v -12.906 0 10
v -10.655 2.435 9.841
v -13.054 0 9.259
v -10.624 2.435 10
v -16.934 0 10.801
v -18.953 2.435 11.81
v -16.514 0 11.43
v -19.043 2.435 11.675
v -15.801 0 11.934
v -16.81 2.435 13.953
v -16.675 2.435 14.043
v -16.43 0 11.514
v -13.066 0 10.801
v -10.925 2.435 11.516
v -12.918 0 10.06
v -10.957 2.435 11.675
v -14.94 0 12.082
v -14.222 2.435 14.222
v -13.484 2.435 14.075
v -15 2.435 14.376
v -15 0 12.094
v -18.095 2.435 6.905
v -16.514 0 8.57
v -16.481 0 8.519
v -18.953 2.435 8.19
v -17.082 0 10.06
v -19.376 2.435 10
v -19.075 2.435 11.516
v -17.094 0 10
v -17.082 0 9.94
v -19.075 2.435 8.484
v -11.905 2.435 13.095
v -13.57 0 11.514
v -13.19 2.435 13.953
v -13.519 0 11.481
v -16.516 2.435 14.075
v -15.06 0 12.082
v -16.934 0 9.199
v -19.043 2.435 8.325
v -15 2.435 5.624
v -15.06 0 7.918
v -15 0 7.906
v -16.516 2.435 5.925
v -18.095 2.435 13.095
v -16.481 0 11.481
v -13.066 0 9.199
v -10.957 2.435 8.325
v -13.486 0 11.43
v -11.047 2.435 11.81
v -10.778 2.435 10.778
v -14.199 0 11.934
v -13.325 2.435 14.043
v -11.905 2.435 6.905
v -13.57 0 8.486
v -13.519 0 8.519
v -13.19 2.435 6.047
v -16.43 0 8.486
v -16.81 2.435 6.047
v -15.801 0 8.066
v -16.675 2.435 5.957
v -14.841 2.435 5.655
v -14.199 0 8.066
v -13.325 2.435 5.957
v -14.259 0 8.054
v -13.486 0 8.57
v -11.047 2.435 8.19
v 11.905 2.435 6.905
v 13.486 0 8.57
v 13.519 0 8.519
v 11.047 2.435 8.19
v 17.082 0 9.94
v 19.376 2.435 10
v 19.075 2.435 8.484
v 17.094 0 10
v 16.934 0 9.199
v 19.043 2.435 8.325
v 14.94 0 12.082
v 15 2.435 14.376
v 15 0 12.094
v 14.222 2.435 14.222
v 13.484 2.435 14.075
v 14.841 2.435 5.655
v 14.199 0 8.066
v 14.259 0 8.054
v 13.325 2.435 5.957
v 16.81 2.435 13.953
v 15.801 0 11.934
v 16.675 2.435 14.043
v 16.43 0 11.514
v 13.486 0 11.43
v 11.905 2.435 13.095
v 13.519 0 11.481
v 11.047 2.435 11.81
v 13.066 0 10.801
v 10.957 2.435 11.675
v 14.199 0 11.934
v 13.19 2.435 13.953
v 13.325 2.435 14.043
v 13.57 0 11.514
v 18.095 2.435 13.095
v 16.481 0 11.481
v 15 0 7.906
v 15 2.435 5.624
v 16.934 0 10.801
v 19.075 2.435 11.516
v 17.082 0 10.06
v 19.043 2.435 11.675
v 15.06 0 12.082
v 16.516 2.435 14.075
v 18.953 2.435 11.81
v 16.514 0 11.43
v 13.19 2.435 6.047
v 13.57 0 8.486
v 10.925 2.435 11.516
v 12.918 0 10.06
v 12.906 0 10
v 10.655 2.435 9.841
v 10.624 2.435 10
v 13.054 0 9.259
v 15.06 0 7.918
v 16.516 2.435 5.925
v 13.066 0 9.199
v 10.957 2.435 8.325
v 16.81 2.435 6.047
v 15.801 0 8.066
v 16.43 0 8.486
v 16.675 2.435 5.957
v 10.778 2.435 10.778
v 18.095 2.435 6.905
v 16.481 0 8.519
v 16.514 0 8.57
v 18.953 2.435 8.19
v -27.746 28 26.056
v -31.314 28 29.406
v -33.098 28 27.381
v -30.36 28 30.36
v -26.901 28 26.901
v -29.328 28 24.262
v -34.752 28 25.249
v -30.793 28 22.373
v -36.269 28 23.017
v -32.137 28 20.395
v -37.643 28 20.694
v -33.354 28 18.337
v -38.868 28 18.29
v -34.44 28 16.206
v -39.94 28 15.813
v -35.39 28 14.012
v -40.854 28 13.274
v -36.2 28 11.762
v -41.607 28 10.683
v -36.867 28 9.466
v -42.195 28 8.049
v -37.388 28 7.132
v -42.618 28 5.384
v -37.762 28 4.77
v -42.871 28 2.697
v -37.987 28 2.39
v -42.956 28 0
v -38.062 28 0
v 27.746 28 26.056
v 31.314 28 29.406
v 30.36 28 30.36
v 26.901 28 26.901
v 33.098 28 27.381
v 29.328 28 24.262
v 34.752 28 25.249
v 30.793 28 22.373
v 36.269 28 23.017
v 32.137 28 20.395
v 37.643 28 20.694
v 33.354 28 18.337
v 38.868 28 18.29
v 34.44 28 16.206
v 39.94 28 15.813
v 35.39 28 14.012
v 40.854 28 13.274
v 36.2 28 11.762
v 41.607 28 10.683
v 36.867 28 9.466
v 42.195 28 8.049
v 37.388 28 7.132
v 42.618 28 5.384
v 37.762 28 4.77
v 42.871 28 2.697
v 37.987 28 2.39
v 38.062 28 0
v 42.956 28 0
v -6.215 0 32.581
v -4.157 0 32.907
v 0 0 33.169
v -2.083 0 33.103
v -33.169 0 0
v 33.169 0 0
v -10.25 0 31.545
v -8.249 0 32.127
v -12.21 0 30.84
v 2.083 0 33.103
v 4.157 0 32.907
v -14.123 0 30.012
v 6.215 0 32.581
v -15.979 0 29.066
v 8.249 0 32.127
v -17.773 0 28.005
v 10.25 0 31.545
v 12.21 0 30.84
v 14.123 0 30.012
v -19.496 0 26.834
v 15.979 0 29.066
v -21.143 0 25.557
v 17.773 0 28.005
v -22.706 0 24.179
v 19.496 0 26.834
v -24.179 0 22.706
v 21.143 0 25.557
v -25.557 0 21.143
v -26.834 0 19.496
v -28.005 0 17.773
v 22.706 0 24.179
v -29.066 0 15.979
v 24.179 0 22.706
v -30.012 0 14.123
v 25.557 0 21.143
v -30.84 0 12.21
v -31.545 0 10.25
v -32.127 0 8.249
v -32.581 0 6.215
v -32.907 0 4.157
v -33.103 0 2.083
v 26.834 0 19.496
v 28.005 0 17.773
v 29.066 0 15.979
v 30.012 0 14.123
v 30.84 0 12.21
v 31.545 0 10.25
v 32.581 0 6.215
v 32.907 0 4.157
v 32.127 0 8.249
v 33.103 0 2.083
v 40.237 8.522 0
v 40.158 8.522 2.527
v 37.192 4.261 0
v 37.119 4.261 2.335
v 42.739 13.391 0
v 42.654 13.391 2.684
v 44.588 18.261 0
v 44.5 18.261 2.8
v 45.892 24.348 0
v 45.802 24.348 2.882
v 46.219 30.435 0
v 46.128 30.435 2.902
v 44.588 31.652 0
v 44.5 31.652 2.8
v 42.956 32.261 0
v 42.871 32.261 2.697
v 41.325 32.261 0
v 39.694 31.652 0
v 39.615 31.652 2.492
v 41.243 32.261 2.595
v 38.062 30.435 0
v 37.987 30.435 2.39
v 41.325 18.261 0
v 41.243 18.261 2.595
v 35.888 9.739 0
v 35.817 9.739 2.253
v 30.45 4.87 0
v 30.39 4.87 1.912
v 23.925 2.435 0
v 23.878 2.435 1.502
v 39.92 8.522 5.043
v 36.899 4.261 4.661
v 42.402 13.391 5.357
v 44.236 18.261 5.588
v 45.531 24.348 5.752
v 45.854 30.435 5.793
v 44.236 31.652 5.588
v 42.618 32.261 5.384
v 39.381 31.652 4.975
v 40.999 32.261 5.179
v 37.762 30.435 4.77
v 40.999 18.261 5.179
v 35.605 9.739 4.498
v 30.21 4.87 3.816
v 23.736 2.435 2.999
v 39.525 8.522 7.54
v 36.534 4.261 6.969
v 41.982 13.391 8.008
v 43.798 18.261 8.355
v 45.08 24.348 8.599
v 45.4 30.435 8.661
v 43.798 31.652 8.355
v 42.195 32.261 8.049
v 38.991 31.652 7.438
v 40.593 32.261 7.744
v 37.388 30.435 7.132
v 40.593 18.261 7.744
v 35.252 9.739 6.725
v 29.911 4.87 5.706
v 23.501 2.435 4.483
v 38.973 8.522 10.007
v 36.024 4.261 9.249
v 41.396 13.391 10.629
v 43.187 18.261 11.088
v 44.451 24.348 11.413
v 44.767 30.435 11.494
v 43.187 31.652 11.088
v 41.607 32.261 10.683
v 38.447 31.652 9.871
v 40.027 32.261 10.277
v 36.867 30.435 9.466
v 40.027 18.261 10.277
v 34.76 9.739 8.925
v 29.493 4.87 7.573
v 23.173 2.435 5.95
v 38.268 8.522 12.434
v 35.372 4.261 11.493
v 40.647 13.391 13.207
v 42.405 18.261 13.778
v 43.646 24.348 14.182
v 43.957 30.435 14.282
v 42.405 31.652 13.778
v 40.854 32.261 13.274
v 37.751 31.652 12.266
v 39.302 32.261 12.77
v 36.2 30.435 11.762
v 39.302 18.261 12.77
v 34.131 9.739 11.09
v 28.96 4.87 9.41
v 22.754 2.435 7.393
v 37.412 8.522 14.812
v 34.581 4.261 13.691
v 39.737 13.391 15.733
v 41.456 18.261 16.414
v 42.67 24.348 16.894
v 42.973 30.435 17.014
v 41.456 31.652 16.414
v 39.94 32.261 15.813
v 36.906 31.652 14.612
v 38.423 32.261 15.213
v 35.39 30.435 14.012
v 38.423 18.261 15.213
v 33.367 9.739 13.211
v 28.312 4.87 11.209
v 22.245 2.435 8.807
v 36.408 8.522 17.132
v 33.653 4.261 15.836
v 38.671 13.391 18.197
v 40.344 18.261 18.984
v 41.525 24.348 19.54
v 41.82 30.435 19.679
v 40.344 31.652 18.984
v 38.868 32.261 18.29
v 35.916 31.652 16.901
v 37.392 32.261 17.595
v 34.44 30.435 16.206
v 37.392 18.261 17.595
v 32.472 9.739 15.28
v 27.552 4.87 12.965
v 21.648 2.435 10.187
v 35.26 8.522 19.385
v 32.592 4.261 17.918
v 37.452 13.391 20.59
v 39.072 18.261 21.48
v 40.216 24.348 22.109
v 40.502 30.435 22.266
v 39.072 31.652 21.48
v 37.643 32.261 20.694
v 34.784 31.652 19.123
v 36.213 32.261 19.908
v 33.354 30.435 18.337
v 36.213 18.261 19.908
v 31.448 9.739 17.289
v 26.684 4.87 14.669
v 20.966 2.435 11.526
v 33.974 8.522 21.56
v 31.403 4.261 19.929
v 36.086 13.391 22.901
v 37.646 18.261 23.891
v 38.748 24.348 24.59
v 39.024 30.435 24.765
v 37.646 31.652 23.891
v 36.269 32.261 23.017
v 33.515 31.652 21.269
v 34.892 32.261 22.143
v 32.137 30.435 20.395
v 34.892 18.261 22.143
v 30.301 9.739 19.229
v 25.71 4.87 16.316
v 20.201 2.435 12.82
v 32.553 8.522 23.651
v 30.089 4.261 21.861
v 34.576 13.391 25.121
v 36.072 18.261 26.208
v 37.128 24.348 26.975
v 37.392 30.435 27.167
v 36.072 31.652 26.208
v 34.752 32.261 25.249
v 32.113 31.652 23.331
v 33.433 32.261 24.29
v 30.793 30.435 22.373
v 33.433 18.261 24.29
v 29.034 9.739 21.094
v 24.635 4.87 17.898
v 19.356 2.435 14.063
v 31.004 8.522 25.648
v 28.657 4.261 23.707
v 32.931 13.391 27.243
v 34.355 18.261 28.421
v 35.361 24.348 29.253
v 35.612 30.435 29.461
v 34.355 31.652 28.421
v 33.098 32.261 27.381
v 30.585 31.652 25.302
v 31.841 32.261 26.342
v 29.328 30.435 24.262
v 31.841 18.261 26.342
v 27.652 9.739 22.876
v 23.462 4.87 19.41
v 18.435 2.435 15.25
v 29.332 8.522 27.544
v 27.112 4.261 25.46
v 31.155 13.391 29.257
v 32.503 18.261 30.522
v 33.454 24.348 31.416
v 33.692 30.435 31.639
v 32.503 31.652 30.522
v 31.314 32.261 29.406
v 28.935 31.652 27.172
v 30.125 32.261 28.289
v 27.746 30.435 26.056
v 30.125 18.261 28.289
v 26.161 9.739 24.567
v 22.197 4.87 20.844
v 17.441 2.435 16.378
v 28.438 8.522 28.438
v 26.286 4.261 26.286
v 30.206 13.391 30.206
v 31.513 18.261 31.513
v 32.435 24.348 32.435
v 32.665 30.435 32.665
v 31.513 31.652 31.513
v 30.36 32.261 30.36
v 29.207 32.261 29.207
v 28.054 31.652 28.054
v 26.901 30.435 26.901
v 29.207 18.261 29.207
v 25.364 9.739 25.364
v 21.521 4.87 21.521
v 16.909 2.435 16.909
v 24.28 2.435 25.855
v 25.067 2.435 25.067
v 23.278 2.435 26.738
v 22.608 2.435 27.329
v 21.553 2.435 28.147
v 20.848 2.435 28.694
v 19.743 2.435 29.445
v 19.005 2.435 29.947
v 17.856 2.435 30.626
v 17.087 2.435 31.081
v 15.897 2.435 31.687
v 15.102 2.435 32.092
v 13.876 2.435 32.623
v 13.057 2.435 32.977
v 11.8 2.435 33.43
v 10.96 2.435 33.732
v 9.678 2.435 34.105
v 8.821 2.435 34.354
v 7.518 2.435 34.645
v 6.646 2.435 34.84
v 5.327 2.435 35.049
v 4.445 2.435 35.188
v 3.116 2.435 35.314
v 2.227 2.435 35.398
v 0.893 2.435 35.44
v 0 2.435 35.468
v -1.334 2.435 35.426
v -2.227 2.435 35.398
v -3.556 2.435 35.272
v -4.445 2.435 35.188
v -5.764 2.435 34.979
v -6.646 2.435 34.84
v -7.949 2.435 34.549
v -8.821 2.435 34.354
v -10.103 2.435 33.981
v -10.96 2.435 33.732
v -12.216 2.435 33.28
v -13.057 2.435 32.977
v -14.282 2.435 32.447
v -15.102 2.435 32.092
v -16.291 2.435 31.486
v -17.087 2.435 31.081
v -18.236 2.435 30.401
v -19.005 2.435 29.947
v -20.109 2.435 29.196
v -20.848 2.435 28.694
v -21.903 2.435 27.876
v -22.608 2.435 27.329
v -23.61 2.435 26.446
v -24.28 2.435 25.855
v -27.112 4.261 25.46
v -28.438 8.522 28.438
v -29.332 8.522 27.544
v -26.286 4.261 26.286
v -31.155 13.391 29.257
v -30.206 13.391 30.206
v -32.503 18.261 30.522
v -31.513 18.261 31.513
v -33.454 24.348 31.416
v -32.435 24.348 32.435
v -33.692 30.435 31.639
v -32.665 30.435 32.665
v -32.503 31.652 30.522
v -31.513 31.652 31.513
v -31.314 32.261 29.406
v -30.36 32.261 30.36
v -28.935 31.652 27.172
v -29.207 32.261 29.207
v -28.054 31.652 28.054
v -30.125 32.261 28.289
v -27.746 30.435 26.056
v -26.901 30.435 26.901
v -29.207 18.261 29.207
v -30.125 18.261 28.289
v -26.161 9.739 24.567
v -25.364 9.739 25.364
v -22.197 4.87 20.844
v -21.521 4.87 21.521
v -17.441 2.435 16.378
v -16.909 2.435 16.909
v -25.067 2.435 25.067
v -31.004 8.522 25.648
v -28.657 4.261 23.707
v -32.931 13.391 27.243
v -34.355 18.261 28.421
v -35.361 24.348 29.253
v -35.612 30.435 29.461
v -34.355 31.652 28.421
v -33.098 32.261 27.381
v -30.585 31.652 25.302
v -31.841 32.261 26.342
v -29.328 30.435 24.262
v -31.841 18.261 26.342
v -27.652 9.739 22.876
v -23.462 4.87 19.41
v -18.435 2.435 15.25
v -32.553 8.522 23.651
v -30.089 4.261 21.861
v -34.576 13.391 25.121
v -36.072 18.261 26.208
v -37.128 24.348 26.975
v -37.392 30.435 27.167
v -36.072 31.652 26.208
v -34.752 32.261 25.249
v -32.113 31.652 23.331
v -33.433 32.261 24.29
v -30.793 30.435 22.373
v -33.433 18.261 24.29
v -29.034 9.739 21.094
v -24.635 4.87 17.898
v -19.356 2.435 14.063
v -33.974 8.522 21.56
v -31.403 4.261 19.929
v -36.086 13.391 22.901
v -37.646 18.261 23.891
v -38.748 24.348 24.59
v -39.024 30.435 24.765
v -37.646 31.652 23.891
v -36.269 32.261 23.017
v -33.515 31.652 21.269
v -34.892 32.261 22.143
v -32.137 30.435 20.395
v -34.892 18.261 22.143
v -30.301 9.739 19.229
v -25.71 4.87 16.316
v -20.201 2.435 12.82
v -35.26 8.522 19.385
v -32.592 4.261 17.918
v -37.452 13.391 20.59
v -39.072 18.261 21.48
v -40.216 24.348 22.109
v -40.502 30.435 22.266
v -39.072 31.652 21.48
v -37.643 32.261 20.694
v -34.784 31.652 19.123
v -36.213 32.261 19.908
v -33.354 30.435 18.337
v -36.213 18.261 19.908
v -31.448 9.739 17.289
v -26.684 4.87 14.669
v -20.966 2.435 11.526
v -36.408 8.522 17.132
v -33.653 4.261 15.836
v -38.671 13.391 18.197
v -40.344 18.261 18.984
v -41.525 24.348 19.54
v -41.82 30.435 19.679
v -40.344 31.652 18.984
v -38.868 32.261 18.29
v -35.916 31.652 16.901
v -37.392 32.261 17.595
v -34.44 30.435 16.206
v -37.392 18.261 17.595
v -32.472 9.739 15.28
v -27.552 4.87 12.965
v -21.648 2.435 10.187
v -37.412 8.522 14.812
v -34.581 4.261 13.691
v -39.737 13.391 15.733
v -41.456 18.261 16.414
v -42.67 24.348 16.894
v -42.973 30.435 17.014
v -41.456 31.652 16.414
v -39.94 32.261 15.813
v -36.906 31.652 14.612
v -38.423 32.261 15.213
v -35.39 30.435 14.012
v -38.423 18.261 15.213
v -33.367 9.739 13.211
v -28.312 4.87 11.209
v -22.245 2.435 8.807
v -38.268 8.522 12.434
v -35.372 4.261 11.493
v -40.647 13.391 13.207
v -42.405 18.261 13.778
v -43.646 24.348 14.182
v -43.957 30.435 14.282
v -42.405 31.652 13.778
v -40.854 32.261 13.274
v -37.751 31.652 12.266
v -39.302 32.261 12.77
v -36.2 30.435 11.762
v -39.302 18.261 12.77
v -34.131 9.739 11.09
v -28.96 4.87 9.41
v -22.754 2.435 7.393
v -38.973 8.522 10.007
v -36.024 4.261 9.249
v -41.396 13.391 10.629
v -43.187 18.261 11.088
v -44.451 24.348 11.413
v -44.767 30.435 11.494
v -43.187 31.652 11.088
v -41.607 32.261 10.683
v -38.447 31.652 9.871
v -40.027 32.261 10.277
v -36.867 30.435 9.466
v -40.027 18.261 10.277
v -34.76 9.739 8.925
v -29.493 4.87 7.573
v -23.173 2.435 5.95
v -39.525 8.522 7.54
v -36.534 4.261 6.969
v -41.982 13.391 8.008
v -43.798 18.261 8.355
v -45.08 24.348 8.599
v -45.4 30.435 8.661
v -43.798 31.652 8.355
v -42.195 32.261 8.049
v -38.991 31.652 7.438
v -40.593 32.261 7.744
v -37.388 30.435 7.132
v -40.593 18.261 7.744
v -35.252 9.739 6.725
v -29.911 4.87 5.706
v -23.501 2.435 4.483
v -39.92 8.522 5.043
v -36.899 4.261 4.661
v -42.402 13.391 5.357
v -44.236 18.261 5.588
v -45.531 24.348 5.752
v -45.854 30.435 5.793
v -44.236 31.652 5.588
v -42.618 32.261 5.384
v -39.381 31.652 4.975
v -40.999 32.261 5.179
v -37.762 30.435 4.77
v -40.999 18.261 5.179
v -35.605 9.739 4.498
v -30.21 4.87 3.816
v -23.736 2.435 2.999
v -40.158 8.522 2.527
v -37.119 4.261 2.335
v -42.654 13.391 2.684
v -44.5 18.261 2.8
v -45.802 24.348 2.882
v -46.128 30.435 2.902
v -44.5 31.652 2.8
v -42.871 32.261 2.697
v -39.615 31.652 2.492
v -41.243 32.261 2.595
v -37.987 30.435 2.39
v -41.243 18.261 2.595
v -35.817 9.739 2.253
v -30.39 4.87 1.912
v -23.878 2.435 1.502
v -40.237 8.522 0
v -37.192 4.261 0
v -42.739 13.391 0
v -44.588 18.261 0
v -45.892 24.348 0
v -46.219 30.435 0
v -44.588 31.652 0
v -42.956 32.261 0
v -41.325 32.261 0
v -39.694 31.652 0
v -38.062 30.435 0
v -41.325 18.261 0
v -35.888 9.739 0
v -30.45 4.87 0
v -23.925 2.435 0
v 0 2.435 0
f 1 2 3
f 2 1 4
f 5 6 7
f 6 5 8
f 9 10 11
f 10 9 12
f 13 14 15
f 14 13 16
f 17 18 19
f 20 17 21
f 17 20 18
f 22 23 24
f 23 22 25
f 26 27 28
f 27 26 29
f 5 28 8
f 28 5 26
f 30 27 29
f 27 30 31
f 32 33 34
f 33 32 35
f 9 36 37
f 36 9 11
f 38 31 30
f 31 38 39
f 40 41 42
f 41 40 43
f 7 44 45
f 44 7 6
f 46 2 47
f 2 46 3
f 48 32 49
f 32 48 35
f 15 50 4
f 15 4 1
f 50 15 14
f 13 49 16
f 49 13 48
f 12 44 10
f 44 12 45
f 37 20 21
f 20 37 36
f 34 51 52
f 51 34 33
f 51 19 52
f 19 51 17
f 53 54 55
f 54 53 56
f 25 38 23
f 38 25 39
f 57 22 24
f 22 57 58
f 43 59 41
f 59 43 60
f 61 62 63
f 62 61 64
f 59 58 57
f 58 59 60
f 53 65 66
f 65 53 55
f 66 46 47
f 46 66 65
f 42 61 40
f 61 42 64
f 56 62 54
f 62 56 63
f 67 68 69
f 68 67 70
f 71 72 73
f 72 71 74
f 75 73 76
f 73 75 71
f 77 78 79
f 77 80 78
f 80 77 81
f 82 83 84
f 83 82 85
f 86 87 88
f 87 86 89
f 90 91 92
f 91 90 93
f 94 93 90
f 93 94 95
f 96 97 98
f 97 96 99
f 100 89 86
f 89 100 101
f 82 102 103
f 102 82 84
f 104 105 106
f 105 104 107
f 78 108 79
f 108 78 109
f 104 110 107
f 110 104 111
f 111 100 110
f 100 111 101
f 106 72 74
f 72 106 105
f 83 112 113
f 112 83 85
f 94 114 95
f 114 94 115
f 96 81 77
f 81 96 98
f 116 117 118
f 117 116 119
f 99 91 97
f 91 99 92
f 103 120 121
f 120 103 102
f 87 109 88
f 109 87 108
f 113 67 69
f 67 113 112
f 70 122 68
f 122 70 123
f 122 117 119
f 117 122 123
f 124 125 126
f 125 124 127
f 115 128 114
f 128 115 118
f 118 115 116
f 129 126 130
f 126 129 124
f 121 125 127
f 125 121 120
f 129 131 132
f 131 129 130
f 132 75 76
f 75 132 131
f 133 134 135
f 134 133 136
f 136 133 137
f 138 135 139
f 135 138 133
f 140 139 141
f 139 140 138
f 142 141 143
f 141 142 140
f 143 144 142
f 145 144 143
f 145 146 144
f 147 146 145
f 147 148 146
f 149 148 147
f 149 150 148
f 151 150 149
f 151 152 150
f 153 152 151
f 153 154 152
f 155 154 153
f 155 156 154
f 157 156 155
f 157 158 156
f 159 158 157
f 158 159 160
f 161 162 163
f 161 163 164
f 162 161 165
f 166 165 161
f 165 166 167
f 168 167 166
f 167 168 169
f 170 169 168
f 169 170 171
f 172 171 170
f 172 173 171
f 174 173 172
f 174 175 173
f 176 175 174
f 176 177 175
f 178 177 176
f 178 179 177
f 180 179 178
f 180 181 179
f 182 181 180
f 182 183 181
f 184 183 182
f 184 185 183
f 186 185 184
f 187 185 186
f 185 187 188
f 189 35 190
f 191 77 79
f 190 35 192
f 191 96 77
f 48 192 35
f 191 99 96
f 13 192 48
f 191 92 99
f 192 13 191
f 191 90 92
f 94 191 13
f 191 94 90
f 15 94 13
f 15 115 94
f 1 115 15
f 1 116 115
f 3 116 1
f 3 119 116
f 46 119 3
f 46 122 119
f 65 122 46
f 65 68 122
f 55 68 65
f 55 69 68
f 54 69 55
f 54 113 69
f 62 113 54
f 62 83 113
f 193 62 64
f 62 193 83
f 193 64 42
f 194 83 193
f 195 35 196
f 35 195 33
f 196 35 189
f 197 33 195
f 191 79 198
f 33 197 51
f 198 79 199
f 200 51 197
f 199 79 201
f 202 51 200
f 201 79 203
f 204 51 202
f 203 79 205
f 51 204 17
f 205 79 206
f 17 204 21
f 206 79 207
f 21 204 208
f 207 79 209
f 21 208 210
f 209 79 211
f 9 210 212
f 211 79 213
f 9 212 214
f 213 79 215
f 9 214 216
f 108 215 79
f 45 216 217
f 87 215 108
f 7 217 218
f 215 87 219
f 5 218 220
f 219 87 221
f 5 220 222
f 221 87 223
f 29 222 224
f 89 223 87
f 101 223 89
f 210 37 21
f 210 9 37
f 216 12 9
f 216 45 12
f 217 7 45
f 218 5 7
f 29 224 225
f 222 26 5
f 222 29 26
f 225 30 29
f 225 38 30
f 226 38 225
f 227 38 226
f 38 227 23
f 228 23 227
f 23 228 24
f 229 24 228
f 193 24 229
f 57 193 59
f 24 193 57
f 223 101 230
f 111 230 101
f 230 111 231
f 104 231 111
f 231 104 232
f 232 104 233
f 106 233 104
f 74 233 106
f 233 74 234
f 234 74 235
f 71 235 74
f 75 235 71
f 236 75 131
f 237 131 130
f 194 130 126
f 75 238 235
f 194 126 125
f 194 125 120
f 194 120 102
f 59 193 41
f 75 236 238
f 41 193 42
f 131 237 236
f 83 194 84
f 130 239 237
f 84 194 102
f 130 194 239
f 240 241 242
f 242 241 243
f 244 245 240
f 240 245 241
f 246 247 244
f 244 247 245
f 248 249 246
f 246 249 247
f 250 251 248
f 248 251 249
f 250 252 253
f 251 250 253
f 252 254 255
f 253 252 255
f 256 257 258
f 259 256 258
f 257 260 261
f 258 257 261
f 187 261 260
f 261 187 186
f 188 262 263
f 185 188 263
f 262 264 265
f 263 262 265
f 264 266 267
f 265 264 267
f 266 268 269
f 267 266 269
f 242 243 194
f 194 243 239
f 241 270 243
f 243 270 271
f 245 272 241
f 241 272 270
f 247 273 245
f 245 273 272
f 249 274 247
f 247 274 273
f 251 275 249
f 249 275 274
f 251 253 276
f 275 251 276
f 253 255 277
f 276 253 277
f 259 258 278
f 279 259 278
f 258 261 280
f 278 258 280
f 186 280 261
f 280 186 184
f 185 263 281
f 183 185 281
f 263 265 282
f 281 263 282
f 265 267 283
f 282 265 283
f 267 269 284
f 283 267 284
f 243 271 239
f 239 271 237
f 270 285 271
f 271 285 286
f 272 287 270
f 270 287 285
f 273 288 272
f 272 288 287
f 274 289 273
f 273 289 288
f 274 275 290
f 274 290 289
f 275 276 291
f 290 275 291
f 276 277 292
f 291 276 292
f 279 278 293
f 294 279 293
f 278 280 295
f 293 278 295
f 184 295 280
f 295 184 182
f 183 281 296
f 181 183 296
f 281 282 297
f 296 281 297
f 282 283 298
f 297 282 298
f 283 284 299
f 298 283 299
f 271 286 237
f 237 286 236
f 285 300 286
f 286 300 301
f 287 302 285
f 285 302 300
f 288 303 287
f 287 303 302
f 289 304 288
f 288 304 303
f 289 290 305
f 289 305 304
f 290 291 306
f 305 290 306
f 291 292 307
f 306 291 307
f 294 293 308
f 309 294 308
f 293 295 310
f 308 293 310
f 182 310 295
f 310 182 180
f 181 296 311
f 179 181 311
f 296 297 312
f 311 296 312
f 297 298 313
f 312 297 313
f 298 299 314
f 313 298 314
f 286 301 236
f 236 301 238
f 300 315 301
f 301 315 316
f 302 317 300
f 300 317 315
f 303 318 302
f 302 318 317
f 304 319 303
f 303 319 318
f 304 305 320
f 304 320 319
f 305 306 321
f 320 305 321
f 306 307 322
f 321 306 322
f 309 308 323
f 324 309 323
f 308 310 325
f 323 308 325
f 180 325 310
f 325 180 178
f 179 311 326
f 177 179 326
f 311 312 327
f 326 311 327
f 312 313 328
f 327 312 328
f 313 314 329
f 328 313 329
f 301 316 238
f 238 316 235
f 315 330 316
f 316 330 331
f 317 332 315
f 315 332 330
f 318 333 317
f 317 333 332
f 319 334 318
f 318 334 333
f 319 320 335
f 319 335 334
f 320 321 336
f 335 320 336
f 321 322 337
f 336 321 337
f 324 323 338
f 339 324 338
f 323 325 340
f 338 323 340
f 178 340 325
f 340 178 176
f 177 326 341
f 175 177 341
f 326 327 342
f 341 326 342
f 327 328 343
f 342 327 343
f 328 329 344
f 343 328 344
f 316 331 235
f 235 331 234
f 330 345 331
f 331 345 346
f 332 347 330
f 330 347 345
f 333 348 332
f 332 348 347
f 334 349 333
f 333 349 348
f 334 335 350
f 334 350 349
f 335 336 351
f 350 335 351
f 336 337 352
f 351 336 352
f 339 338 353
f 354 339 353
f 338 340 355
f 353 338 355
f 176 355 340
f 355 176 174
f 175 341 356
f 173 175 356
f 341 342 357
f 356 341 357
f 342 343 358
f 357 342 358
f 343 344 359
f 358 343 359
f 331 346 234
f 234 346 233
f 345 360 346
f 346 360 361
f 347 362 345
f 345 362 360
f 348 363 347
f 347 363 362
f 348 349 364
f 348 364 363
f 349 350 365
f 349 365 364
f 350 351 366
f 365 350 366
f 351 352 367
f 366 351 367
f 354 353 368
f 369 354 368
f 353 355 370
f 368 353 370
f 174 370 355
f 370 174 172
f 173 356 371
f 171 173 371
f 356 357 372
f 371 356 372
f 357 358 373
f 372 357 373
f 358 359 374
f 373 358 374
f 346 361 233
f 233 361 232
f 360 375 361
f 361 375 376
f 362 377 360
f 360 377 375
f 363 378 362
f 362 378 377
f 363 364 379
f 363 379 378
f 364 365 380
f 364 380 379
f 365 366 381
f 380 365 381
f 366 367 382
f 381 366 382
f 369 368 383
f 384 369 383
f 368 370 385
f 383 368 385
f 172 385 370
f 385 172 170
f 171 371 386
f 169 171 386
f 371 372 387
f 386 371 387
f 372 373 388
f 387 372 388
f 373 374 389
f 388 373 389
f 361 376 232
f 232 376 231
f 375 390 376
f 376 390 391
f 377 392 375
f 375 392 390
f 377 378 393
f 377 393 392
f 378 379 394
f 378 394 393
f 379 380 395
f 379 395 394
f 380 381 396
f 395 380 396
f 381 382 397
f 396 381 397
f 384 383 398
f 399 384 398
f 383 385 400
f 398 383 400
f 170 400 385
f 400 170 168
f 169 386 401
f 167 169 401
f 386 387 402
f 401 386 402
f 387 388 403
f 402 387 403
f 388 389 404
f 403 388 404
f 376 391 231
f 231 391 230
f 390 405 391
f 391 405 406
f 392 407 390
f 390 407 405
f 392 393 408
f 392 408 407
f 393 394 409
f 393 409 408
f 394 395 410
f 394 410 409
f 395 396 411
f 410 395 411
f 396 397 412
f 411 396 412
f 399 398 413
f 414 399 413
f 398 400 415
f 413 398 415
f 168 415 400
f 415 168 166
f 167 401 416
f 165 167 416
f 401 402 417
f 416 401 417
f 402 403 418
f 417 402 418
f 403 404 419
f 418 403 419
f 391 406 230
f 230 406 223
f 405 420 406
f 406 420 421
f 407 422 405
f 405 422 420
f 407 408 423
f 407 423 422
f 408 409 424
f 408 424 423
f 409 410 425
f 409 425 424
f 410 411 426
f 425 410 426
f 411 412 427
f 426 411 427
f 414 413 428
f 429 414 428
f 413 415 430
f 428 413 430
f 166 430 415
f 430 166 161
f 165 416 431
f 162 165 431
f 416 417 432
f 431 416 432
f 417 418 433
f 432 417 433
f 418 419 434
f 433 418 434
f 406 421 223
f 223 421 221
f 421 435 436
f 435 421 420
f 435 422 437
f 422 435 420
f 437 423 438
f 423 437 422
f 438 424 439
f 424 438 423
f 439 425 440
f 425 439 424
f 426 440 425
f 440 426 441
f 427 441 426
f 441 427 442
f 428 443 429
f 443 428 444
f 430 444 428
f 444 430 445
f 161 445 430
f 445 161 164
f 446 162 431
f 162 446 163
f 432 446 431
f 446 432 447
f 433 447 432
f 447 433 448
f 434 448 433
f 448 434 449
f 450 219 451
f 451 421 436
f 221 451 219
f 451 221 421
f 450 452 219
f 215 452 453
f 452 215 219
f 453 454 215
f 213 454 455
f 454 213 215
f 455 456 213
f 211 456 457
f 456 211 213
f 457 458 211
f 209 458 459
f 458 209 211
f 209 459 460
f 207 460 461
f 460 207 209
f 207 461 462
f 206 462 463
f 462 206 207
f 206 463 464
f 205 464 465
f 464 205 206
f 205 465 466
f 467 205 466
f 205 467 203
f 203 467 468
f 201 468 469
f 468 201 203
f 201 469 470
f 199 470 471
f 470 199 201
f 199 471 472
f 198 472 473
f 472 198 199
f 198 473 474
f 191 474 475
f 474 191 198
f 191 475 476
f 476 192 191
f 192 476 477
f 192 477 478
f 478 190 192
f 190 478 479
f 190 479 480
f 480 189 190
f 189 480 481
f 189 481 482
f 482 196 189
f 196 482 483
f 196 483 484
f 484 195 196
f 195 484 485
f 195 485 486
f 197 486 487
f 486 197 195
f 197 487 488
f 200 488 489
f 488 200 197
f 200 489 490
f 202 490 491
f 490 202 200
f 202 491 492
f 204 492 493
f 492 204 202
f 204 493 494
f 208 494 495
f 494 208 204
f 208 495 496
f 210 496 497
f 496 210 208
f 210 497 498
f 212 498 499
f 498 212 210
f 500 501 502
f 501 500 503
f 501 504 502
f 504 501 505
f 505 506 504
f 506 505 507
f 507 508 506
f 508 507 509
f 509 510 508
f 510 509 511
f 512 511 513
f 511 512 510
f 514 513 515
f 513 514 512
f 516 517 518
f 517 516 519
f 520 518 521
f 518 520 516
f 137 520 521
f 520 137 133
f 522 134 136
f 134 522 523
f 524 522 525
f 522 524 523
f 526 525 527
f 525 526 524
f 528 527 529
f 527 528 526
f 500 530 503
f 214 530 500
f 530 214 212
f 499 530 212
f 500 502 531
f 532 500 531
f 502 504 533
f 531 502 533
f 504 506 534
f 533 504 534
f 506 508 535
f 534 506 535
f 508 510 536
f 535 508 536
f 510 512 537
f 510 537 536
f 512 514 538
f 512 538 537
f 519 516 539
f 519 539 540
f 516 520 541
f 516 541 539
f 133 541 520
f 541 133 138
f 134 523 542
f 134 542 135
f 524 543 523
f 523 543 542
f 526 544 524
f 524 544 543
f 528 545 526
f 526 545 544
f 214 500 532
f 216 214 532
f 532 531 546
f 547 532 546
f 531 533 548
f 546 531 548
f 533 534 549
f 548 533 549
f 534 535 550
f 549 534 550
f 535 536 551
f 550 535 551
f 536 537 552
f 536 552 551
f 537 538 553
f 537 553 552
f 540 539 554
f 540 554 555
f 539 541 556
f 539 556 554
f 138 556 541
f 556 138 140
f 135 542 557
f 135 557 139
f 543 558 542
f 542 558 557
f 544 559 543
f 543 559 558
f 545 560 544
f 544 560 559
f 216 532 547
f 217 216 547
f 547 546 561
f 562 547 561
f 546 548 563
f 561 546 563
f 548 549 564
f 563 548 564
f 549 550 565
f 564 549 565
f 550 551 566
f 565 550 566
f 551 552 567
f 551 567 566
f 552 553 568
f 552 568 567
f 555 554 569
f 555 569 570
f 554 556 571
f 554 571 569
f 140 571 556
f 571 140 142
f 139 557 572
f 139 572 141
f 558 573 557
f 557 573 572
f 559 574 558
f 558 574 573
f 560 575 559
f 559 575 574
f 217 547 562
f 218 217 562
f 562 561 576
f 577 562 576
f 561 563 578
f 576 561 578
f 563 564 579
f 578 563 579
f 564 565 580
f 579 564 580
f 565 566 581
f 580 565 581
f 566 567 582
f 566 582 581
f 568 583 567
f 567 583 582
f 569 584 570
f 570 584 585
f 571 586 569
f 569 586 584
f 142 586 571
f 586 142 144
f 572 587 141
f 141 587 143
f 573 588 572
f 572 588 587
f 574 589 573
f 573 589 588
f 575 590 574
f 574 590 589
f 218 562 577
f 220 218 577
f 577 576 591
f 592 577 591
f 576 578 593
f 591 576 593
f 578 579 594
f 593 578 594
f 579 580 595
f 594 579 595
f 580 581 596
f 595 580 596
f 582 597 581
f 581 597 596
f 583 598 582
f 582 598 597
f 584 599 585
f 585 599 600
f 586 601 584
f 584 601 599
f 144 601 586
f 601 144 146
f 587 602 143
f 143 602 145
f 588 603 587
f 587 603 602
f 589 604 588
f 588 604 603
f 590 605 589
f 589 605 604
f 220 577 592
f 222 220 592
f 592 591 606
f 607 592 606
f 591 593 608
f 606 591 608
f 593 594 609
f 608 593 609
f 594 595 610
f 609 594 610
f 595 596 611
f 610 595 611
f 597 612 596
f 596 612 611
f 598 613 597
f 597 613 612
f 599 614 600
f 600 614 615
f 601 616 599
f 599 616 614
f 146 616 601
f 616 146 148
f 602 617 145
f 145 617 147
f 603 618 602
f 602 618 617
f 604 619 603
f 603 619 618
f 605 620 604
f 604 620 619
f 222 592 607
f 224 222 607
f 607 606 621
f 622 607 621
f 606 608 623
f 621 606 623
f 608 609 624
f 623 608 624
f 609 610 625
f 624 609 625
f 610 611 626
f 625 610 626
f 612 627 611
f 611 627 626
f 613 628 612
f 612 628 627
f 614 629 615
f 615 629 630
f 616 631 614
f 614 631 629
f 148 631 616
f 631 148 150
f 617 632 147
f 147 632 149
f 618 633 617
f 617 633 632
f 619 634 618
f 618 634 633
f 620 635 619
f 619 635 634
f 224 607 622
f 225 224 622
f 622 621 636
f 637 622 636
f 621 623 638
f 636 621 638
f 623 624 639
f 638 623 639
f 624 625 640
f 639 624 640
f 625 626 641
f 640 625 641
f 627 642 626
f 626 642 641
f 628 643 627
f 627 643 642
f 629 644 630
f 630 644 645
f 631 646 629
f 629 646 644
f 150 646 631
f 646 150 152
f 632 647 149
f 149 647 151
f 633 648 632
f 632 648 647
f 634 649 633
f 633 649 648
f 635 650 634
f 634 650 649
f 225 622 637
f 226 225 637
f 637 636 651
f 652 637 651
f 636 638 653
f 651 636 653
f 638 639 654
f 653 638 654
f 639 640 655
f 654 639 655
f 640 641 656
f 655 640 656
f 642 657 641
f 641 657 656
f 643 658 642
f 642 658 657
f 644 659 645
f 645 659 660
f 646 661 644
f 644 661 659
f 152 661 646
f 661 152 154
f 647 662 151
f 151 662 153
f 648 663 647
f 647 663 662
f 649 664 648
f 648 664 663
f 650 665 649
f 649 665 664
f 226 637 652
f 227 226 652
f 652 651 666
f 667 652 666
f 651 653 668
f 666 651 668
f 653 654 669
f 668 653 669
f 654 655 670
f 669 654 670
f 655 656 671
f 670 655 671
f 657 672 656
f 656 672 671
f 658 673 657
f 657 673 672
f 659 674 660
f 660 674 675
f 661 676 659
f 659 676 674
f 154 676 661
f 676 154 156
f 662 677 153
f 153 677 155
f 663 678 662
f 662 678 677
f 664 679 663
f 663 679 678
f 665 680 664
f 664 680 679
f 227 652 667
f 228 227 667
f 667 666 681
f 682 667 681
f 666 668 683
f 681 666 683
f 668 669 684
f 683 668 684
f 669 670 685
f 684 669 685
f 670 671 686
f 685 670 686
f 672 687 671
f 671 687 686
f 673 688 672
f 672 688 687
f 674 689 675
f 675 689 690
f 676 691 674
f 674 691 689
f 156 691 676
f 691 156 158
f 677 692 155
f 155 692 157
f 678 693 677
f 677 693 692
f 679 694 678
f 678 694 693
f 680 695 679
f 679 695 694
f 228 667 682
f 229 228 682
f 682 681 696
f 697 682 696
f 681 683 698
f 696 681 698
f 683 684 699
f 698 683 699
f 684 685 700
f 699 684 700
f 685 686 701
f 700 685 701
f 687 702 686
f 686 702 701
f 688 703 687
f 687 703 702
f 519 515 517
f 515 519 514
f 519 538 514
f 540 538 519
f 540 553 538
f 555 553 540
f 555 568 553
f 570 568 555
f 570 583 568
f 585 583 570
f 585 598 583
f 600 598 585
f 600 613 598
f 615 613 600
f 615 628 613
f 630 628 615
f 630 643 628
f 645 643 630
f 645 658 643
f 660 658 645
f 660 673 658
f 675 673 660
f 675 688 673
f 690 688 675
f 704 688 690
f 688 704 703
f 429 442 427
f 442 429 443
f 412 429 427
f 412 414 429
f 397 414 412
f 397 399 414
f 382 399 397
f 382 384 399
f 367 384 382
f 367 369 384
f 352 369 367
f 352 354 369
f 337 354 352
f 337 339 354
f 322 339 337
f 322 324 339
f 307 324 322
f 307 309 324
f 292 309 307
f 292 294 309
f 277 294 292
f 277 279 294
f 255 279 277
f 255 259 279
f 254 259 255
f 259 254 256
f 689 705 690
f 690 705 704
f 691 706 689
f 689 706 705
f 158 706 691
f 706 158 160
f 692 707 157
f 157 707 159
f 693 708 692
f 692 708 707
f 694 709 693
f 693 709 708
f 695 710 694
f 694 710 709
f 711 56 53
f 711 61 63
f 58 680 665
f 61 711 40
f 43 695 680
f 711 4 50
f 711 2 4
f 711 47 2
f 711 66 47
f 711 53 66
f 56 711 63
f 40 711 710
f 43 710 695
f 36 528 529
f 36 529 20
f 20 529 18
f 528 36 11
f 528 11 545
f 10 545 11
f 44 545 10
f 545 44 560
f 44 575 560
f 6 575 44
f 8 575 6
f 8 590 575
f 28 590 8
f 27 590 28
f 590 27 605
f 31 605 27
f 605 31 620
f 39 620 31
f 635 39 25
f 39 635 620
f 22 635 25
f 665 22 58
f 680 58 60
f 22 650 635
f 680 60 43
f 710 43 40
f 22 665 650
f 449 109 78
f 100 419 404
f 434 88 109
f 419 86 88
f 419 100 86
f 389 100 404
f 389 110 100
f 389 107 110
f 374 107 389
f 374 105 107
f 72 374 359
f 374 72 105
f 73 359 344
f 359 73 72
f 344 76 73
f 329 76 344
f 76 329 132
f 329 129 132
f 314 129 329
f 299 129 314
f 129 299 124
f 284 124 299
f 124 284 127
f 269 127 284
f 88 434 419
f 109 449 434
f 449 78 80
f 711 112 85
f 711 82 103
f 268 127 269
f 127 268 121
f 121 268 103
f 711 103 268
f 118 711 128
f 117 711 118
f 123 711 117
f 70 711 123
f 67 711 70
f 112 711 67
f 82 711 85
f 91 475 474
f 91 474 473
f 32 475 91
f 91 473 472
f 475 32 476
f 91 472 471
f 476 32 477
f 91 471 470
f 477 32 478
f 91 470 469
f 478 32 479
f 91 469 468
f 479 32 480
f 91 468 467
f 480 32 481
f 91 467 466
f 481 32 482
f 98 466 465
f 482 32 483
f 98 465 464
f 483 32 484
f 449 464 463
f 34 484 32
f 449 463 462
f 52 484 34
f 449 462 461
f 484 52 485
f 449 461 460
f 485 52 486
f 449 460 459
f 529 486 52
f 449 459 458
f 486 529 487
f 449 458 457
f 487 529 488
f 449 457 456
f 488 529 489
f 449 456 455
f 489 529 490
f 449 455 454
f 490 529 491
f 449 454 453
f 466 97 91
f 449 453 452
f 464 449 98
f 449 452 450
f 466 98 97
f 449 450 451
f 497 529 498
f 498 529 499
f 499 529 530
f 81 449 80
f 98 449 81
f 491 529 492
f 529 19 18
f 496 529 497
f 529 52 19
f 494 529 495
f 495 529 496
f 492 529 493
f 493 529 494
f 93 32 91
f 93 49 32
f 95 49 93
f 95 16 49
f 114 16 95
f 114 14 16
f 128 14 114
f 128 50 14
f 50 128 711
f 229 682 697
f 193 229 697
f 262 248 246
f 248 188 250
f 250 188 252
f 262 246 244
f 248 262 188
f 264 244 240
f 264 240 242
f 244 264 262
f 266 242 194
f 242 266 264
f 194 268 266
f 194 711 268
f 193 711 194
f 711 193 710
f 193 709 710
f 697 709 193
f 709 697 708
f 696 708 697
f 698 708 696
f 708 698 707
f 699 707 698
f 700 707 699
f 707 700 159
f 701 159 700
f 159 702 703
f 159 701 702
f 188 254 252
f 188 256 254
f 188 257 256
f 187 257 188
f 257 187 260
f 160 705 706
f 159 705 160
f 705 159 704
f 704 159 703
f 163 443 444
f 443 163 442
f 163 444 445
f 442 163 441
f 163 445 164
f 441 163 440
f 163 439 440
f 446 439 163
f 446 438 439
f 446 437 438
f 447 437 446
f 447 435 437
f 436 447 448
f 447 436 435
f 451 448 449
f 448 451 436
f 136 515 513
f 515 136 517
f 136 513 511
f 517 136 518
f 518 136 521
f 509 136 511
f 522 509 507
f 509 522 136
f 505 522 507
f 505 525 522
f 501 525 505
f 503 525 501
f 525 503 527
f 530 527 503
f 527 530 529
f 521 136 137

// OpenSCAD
//Remote generation: 0 is for gen2, 1 is for gen3
gen=0; //[0:Generation2, 1:Generation3]

//Put in holes to mount with screws?
holes=1; //[0:no, 1:yes]

//Cut out the bottom to better reach the buttons
cut_bottom=1; //[0:no, 1:yes]

/* [Hidden] */

/*
HueHolder Gen2 and Gen3
Version 6, January 2015
Written by MC Geisler (mcgenki at gmail dot com)

A convenient storage for your remote control.

Have fun!

License: Attribution 4.0 International (CC BY 4.0)

You are free to:
    Share — copy and redistribute the material in any medium or format
    Adapt — remix, transform, and build upon the material
    for any purpose, even commercially.
*/


//to fix the scales so both remotes fit
scaleall=40/39.5;


//for scaling to gen2 remote (from gen3 remote)
//0 entry is radius and height of gen2 remote, 1 entry is for gen3 remote (original holder was for gen3)
rr=[43.5/scaleall,40];
zz=[28,23];

//for scaling to gen2 remote (from gen3 remote) if gen=0
scale_r=rr[gen]/rr[1]*scaleall;
scale_z=zz[gen]/zz[1];

rotate ([270,0,0])
{
  difference()
	{
		//original size gen3 hole: 40mm radius maximal, 23mm height
		//gen2 size: 42mm radius, 26mm height 
		//gen2 hole: 44mm radius, 28mm height

                echo ("Outer radius of remote:", 39.5*scale_r);
		scale([scale_r,scale_r,scale_z])
			rotate_extrude($fn=100) 
				polygon( points=[[0,0],[30.5,0],[34.2,3.5],[37,7],[39.3,11],[41,15],[42.2,20],[42.5,25],
					[41,26],[39.5,26.5],[38,26.5],[36.5,26],
					[35,25],[35,23],[39.5,23],[38,15],[33,8],[28,4],[22,2],[0,2]] );

		//cut off lower part
		translate([-90,0,-1]) 
			cube(size=[160,160,60], center=false);

		if (holes == 1)
                {       
                    //two holes for mounting
                    translate([-15,-10,-.1]) 
			cylinder(h=3.2, r1=2, r2=5);
                    translate([15,-10,-.1]) 
			cylinder(h=3.2, r1=2, r2=5);
                }
                
                if (cut_bottom==1)
                {
                    //cut off diagonally
                    translate([0,-rr[gen]*sqrt(2),rr[gen]+2*scale_z]) 
			rotate([0,0,45])
				cube(size=rr[gen]*2, center=true);
		}
  	}
};
